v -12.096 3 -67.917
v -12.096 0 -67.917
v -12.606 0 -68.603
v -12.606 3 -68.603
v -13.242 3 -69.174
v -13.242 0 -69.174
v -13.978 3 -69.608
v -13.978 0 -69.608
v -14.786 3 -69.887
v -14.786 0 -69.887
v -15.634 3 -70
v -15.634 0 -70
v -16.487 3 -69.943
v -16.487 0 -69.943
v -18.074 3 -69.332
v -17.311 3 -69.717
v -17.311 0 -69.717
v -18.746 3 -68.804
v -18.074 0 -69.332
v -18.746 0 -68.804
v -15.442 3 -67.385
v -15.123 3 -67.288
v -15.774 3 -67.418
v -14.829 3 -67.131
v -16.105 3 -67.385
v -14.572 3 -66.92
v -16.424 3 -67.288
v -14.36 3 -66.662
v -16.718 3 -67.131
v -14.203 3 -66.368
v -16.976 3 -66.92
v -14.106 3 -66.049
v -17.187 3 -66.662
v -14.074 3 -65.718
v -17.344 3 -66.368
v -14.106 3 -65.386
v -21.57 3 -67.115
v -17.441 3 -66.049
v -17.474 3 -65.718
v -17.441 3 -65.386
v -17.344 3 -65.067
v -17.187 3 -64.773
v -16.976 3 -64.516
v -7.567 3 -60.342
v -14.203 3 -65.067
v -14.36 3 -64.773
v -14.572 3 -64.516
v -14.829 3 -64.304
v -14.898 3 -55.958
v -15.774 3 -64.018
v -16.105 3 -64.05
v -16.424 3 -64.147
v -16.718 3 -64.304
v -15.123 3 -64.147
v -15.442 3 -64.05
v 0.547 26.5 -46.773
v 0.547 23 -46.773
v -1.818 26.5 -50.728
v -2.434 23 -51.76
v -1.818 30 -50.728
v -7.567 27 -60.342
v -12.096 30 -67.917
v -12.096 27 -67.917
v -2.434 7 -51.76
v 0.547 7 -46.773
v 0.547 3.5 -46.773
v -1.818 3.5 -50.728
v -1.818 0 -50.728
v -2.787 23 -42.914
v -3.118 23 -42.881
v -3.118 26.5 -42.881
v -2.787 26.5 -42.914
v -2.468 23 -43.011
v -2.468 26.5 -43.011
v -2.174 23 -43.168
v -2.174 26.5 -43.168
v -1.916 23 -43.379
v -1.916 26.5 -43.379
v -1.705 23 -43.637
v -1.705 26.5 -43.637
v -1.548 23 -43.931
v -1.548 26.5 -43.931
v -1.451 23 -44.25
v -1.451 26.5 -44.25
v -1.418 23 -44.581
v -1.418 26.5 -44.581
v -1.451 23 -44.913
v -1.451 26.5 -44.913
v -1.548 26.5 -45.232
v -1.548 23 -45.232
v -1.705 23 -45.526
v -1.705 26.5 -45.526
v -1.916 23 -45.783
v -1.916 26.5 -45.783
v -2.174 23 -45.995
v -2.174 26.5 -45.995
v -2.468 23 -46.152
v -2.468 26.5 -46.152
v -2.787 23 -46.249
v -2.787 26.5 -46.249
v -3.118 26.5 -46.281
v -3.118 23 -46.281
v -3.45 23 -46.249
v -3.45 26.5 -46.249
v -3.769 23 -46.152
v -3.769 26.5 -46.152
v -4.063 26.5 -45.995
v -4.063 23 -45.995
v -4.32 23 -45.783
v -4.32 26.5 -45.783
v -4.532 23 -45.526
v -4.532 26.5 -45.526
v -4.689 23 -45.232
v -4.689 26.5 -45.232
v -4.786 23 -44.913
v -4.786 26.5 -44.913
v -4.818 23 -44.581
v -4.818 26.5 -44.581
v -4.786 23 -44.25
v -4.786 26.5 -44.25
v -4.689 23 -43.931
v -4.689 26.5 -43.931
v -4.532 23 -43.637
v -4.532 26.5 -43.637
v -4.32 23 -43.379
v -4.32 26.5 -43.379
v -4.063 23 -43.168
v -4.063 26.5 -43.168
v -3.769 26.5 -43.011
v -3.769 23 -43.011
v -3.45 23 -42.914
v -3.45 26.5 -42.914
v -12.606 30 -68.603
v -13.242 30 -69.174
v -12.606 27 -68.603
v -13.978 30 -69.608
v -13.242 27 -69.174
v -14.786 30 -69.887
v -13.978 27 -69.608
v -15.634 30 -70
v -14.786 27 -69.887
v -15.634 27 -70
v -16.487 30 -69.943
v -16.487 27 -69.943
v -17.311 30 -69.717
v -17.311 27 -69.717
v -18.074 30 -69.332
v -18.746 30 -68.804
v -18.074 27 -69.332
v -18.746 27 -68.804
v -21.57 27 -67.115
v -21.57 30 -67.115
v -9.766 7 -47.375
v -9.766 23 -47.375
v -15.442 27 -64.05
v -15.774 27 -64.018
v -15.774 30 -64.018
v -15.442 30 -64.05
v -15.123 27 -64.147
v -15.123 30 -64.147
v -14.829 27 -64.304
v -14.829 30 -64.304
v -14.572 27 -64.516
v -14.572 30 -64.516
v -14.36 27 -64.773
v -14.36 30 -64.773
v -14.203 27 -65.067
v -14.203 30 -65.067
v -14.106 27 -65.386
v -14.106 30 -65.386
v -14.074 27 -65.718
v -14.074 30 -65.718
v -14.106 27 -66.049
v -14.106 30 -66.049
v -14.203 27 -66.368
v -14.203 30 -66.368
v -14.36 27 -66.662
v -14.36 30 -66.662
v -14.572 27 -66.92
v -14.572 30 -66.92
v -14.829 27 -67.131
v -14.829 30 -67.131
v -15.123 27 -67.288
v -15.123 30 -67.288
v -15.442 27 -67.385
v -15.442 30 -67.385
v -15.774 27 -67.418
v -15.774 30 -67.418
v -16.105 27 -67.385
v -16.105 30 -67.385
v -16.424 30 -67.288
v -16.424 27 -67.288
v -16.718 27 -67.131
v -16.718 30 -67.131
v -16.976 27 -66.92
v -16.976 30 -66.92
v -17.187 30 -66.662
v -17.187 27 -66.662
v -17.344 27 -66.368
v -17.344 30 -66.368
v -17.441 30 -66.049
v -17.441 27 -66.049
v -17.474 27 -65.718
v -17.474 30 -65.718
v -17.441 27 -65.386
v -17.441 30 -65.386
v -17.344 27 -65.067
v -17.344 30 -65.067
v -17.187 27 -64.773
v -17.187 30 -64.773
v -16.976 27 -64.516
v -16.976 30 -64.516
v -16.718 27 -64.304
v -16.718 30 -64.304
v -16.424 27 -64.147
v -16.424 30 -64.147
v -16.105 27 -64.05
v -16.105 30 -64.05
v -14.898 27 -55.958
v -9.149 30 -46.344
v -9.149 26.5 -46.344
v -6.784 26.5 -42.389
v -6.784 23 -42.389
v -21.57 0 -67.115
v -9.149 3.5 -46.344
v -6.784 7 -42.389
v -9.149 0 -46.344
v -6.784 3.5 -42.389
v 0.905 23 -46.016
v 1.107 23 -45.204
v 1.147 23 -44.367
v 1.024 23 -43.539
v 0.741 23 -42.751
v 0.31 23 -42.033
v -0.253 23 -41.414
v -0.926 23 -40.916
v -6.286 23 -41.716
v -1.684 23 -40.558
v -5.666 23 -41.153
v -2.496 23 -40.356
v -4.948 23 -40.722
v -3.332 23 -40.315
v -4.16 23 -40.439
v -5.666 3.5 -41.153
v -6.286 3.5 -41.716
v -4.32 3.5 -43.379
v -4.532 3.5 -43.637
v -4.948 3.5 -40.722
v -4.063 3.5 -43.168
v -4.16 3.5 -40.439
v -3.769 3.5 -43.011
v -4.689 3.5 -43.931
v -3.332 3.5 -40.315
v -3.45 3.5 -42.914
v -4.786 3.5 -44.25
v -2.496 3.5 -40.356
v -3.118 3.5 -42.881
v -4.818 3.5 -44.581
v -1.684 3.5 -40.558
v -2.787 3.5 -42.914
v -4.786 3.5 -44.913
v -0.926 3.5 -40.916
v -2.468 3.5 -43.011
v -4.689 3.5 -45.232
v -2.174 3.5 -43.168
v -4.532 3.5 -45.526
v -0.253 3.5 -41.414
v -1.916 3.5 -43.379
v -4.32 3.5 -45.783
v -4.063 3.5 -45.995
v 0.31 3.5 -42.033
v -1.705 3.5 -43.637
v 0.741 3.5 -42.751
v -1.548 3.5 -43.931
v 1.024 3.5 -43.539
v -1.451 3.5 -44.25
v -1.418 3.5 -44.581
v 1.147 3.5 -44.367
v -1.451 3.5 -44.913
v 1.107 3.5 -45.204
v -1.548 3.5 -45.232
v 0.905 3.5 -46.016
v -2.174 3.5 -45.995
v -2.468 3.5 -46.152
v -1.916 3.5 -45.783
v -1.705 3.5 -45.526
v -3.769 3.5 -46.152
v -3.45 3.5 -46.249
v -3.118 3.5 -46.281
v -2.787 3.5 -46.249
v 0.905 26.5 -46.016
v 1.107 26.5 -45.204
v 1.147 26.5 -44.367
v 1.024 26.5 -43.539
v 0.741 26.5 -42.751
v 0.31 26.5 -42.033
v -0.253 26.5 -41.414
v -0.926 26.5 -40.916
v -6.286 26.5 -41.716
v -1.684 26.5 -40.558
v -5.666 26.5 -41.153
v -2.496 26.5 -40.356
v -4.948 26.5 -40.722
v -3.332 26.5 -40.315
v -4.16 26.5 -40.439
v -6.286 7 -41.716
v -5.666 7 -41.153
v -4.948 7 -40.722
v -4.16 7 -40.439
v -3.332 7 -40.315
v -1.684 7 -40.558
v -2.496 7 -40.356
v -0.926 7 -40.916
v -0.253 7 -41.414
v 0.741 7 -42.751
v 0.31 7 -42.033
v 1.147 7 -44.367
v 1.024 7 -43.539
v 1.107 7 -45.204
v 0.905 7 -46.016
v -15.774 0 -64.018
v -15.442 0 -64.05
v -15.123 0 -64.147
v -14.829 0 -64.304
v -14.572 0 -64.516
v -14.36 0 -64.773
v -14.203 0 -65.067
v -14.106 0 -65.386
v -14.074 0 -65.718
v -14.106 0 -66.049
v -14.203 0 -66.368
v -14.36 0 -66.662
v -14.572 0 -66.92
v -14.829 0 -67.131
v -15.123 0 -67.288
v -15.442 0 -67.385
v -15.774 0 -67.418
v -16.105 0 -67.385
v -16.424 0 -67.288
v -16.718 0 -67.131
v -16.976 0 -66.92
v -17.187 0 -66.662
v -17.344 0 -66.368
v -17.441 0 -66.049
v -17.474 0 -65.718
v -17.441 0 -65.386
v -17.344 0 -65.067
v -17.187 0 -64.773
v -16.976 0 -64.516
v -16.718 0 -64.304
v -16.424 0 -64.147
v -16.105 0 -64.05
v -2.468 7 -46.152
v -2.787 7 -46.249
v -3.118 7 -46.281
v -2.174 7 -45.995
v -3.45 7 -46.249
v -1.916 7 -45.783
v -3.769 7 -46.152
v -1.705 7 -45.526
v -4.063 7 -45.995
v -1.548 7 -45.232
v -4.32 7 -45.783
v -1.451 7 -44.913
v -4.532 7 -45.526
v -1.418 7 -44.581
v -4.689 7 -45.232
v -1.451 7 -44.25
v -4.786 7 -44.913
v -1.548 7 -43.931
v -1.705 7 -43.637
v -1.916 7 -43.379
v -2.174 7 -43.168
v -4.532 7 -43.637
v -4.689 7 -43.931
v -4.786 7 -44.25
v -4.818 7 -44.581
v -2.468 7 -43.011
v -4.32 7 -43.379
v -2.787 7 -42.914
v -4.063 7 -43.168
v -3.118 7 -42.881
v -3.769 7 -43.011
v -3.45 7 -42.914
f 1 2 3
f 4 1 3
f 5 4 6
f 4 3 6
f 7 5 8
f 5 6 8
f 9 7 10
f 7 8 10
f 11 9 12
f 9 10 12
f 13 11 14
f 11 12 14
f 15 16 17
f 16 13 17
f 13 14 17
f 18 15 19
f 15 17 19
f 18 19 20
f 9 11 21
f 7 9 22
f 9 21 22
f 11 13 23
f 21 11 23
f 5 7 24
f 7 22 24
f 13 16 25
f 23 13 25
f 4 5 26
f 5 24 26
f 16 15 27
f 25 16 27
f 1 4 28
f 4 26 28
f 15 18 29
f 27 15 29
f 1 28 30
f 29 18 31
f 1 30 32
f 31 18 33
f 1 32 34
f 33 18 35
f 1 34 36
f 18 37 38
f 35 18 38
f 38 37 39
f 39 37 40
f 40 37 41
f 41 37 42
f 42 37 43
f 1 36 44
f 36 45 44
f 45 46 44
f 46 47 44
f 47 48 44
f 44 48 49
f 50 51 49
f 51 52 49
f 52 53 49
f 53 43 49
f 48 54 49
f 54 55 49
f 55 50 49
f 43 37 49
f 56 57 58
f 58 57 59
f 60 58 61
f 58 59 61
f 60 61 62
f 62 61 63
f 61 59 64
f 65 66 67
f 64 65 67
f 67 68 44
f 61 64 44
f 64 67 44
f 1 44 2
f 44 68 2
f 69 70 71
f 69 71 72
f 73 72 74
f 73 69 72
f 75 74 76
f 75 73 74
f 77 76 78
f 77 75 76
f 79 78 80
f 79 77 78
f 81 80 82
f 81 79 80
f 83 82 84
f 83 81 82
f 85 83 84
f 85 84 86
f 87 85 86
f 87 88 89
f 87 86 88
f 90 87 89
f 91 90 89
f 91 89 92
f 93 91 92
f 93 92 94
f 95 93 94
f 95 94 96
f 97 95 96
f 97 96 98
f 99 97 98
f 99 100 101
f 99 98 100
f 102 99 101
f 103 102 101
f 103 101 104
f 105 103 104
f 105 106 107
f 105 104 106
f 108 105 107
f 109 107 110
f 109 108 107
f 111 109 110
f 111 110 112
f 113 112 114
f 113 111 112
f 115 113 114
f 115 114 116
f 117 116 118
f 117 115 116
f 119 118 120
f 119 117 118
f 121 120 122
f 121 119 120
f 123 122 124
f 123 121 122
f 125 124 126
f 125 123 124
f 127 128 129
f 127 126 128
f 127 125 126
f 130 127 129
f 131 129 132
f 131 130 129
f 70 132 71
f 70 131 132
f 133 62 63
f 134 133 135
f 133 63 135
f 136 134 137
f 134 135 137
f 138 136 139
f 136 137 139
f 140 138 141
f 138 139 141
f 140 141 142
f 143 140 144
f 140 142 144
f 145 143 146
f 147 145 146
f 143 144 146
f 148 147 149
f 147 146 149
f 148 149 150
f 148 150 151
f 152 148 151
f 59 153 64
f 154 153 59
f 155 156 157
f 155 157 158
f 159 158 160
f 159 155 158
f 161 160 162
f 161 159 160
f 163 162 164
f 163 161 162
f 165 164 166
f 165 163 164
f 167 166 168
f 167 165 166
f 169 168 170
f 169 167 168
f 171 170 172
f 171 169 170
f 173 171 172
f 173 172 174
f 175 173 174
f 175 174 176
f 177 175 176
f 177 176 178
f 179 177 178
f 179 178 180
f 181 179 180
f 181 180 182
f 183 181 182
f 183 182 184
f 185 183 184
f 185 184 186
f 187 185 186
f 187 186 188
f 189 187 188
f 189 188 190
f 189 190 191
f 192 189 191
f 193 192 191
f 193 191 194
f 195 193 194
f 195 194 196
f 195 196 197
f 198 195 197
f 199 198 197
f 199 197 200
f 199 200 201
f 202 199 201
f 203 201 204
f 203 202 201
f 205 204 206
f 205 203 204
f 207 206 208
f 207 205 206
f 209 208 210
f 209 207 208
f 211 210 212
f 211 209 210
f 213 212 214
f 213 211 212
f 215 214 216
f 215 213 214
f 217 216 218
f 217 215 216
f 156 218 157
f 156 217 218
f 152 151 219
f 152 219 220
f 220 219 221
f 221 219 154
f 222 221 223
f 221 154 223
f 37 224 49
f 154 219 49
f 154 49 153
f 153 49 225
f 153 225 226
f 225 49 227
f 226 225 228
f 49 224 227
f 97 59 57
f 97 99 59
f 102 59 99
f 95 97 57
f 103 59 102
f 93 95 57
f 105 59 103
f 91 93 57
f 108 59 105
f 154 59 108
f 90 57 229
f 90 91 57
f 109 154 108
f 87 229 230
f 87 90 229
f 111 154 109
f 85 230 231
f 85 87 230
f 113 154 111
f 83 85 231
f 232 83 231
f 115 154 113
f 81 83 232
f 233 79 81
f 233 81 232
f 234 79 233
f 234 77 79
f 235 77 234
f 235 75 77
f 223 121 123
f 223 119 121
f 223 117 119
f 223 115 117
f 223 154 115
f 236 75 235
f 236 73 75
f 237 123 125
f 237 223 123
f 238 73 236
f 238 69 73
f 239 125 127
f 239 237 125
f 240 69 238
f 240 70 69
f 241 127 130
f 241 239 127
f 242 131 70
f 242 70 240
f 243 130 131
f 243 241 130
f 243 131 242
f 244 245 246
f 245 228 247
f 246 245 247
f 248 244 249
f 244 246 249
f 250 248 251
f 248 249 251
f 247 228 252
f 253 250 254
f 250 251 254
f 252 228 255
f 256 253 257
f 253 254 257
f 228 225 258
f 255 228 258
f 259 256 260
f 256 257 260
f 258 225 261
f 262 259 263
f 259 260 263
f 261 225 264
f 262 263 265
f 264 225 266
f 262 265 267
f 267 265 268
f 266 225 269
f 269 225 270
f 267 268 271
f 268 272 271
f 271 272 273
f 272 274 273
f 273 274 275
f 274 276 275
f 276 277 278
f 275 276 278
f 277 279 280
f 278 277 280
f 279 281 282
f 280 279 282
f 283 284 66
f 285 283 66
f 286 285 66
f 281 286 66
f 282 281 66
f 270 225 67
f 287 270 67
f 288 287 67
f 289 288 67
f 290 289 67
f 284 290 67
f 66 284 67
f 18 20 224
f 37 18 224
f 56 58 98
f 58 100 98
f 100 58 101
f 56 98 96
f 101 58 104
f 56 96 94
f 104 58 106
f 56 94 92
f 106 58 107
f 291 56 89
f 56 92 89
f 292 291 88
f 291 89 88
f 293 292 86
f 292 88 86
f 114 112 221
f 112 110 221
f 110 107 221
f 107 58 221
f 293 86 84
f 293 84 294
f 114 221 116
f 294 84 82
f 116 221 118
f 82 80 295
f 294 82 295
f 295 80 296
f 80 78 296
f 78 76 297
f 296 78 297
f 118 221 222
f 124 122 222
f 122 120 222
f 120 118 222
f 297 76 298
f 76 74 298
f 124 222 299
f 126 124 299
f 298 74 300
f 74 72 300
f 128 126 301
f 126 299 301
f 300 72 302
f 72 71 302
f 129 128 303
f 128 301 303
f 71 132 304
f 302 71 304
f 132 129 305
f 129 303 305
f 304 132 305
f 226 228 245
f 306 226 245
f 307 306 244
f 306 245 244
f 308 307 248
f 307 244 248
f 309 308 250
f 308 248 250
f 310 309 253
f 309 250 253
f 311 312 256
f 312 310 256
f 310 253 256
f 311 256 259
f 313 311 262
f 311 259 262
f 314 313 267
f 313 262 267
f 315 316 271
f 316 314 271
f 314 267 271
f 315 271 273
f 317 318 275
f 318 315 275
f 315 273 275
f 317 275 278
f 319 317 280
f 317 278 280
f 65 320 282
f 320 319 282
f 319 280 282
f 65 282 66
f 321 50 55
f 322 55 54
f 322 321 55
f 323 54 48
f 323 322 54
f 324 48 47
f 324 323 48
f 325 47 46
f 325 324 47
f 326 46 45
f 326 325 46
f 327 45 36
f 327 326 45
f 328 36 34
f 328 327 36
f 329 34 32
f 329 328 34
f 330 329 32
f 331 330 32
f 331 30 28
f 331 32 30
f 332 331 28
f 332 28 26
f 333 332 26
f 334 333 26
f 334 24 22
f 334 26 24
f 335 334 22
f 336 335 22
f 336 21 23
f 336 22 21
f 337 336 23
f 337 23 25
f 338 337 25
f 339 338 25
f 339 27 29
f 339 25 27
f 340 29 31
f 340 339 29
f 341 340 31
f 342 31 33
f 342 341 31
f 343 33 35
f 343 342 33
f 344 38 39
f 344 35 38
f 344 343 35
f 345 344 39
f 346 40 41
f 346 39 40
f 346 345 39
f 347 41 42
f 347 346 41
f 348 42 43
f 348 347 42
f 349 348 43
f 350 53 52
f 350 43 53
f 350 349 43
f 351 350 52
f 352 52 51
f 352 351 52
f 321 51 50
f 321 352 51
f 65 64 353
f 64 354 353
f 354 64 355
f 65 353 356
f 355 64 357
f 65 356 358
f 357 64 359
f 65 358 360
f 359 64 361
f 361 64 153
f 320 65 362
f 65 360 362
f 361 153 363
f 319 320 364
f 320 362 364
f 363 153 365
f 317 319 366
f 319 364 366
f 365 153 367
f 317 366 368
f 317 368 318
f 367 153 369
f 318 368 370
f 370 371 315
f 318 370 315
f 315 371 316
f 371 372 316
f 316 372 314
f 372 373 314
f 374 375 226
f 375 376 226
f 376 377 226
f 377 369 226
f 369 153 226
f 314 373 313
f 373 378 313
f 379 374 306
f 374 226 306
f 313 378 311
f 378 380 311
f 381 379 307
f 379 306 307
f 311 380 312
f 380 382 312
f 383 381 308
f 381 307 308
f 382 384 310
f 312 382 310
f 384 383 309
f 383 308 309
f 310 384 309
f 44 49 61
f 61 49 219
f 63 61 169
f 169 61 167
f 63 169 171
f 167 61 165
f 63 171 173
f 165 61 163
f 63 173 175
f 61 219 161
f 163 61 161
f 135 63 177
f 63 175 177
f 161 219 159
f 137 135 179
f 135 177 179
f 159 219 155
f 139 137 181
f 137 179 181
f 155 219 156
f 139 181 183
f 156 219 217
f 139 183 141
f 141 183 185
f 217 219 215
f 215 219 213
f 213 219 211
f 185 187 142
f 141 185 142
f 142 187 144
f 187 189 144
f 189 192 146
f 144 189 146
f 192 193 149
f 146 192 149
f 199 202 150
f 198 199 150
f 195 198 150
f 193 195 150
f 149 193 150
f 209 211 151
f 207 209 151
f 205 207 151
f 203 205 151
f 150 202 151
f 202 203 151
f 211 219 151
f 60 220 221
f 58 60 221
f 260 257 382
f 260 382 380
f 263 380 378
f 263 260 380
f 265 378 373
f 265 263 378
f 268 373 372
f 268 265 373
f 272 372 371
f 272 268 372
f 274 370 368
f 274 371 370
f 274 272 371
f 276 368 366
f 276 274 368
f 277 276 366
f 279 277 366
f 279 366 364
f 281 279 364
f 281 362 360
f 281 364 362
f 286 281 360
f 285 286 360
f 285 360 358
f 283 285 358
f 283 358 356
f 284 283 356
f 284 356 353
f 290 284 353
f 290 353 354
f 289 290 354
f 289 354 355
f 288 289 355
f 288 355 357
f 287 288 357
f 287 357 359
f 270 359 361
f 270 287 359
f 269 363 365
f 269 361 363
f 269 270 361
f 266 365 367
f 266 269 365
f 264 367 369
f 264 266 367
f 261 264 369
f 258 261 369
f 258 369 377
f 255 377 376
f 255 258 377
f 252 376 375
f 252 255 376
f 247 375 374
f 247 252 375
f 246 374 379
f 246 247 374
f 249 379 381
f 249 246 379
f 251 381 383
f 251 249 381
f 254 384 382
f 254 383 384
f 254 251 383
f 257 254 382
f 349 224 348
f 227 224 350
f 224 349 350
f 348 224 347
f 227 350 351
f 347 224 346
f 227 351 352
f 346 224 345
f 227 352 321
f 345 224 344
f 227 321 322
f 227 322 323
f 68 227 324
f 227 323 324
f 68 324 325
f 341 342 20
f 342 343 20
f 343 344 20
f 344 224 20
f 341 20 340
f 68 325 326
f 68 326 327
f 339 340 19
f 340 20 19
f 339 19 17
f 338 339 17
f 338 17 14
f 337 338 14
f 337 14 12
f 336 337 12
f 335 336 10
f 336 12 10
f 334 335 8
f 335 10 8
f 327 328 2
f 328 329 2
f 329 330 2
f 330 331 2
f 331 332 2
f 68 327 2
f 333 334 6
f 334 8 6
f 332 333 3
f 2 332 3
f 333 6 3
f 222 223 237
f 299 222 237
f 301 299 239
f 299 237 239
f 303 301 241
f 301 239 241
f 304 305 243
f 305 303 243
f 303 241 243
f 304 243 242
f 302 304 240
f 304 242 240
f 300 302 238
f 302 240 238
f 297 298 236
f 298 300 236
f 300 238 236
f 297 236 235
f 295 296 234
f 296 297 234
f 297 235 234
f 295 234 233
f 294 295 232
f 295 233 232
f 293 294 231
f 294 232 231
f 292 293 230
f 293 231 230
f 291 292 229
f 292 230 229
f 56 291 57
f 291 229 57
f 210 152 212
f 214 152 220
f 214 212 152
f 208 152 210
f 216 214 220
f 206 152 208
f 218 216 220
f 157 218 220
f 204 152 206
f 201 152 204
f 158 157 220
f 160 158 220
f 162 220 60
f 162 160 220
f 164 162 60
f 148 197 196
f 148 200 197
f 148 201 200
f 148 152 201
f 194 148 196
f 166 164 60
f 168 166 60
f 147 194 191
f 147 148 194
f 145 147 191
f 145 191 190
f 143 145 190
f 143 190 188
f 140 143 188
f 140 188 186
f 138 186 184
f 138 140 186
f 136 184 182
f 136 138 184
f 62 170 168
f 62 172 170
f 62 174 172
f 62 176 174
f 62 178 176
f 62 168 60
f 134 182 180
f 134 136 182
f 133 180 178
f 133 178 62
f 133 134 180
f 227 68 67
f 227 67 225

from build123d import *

# Parameters (mm, degrees)
SKETCH1_R           = 1.7
BOSS_EXTRUDE1_DEPTH = 30
SKETCH2_W           = 13
SKETCH2_H           = 24
SKETCH2_W_2         = 7.133537961
CUT_EXTRUDE2_DEPTH  = 30
SKETCH3_W           = 16.393620584
SKETCH3_H           = 16
CUT_EXTRUDE3_DEPTH  = 30
CUT_EXTRUDE4_DEPTH  = 3.5
CUT_EXTRUDE5_DEPTH  = 78.230456788


with BuildPart() as part:
    # Sketch1 → Boss-Extrude1 (new body)
    with BuildSketch(Plane(origin=(0, 0, 0), x_dir=(1, 0, 0), z_dir=(0, 1, 0))):
        with BuildLine():
            Line((0.547347337, 46.773363131), (-12.096275709, 67.916751063))
            ThreePointArc((-12.096275709, 67.916751063), (-15.207212104, 69.964878097), (-18.746235825, 68.803817933))
            Line((-18.746235825, 68.803817933), (-21.570135396, 67.115142409))
            Line((-21.570135396, 67.115142409), (-6.784148434, 42.389171288))
            ThreePointArc((-6.784148434, 42.389171288), (-0.926304627, 40.915519323), (0.547347337, 46.773363131))
        make_face()
        with Locations(Location((-3.118400548, 44.581267209, 0), (0, 0, 270))):
            Circle(SKETCH1_R, mode=Mode.SUBTRACT)
        with Locations(Location((-15.773770801, 65.71763038, 0), (0, 0, 270))):
            Circle(SKETCH1_R, mode=Mode.SUBTRACT)
    extrude(amount=BOSS_EXTRUDE1_DEPTH)

    # Sketch2 → Cut-Extrude2 (cut)
    with BuildSketch(Plane(origin=(13.674403301, 0, -8.177213665), x_dir=(0.5132293910361586, 0, 0.8582514737398672), z_dir=(-0.8582514737398672, 0, 0.5132293910361586))):
        with Locations((-62.172097336, 15)):
            Rectangle(SKETCH2_W, SKETCH2_H)
        with Locations((-72.238866317, 15)):
            Rectangle(SKETCH2_W_2, SKETCH2_H)
    extrude(amount=-CUT_EXTRUDE2_DEPTH, mode=Mode.SUBTRACT)

    # Sketch3 → Cut-Extrude3 (cut)
    with BuildSketch(Plane(origin=(13.674403301, 0, -8.177213665), x_dir=(0.5132293910361586, 0, 0.8582514737398672), z_dir=(-0.8582514737398672, 0, 0.5132293910361586))):
        with Locations((-37.475287044, 15)):
            Rectangle(SKETCH3_W, SKETCH3_H)
    extrude(amount=-CUT_EXTRUDE3_DEPTH, mode=Mode.SUBTRACT)

    # Sketch7 → Cut-Extrude4 (cut)
    with BuildSketch(Plane(origin=(0, 0, 0), x_dir=(-1, 0, 0), z_dir=(0, -1, 0))):
        Polygon((1.817751365, 50.728416138), (9.149247136, 46.344224296), (4.210618406, 38.085567524), (-3.391020631, 42.018010382), align=None)
    extrude(amount=-CUT_EXTRUDE4_DEPTH, mode=Mode.SUBTRACT)

    # Sketch9 → Cut-Extrude5 (cut, through all)
    with BuildSketch(Plane(origin=(13.674403301, 0, -8.177213665), x_dir=(0.5132293910361586, 0, 0.8582514737398672), z_dir=(-0.8582514737398672, 0, 0.5132293910361586))):
        Polygon((-44.470661337, 30), (-44.470661337, 26.5), (-33.41668301, 26.5), (-33.41668301, 30.544862053), (-44.470661337, 30.544862053), align=None)
    extrude(amount=-CUT_EXTRUDE5_DEPTH, mode=Mode.SUBTRACT)


solid = part.part
